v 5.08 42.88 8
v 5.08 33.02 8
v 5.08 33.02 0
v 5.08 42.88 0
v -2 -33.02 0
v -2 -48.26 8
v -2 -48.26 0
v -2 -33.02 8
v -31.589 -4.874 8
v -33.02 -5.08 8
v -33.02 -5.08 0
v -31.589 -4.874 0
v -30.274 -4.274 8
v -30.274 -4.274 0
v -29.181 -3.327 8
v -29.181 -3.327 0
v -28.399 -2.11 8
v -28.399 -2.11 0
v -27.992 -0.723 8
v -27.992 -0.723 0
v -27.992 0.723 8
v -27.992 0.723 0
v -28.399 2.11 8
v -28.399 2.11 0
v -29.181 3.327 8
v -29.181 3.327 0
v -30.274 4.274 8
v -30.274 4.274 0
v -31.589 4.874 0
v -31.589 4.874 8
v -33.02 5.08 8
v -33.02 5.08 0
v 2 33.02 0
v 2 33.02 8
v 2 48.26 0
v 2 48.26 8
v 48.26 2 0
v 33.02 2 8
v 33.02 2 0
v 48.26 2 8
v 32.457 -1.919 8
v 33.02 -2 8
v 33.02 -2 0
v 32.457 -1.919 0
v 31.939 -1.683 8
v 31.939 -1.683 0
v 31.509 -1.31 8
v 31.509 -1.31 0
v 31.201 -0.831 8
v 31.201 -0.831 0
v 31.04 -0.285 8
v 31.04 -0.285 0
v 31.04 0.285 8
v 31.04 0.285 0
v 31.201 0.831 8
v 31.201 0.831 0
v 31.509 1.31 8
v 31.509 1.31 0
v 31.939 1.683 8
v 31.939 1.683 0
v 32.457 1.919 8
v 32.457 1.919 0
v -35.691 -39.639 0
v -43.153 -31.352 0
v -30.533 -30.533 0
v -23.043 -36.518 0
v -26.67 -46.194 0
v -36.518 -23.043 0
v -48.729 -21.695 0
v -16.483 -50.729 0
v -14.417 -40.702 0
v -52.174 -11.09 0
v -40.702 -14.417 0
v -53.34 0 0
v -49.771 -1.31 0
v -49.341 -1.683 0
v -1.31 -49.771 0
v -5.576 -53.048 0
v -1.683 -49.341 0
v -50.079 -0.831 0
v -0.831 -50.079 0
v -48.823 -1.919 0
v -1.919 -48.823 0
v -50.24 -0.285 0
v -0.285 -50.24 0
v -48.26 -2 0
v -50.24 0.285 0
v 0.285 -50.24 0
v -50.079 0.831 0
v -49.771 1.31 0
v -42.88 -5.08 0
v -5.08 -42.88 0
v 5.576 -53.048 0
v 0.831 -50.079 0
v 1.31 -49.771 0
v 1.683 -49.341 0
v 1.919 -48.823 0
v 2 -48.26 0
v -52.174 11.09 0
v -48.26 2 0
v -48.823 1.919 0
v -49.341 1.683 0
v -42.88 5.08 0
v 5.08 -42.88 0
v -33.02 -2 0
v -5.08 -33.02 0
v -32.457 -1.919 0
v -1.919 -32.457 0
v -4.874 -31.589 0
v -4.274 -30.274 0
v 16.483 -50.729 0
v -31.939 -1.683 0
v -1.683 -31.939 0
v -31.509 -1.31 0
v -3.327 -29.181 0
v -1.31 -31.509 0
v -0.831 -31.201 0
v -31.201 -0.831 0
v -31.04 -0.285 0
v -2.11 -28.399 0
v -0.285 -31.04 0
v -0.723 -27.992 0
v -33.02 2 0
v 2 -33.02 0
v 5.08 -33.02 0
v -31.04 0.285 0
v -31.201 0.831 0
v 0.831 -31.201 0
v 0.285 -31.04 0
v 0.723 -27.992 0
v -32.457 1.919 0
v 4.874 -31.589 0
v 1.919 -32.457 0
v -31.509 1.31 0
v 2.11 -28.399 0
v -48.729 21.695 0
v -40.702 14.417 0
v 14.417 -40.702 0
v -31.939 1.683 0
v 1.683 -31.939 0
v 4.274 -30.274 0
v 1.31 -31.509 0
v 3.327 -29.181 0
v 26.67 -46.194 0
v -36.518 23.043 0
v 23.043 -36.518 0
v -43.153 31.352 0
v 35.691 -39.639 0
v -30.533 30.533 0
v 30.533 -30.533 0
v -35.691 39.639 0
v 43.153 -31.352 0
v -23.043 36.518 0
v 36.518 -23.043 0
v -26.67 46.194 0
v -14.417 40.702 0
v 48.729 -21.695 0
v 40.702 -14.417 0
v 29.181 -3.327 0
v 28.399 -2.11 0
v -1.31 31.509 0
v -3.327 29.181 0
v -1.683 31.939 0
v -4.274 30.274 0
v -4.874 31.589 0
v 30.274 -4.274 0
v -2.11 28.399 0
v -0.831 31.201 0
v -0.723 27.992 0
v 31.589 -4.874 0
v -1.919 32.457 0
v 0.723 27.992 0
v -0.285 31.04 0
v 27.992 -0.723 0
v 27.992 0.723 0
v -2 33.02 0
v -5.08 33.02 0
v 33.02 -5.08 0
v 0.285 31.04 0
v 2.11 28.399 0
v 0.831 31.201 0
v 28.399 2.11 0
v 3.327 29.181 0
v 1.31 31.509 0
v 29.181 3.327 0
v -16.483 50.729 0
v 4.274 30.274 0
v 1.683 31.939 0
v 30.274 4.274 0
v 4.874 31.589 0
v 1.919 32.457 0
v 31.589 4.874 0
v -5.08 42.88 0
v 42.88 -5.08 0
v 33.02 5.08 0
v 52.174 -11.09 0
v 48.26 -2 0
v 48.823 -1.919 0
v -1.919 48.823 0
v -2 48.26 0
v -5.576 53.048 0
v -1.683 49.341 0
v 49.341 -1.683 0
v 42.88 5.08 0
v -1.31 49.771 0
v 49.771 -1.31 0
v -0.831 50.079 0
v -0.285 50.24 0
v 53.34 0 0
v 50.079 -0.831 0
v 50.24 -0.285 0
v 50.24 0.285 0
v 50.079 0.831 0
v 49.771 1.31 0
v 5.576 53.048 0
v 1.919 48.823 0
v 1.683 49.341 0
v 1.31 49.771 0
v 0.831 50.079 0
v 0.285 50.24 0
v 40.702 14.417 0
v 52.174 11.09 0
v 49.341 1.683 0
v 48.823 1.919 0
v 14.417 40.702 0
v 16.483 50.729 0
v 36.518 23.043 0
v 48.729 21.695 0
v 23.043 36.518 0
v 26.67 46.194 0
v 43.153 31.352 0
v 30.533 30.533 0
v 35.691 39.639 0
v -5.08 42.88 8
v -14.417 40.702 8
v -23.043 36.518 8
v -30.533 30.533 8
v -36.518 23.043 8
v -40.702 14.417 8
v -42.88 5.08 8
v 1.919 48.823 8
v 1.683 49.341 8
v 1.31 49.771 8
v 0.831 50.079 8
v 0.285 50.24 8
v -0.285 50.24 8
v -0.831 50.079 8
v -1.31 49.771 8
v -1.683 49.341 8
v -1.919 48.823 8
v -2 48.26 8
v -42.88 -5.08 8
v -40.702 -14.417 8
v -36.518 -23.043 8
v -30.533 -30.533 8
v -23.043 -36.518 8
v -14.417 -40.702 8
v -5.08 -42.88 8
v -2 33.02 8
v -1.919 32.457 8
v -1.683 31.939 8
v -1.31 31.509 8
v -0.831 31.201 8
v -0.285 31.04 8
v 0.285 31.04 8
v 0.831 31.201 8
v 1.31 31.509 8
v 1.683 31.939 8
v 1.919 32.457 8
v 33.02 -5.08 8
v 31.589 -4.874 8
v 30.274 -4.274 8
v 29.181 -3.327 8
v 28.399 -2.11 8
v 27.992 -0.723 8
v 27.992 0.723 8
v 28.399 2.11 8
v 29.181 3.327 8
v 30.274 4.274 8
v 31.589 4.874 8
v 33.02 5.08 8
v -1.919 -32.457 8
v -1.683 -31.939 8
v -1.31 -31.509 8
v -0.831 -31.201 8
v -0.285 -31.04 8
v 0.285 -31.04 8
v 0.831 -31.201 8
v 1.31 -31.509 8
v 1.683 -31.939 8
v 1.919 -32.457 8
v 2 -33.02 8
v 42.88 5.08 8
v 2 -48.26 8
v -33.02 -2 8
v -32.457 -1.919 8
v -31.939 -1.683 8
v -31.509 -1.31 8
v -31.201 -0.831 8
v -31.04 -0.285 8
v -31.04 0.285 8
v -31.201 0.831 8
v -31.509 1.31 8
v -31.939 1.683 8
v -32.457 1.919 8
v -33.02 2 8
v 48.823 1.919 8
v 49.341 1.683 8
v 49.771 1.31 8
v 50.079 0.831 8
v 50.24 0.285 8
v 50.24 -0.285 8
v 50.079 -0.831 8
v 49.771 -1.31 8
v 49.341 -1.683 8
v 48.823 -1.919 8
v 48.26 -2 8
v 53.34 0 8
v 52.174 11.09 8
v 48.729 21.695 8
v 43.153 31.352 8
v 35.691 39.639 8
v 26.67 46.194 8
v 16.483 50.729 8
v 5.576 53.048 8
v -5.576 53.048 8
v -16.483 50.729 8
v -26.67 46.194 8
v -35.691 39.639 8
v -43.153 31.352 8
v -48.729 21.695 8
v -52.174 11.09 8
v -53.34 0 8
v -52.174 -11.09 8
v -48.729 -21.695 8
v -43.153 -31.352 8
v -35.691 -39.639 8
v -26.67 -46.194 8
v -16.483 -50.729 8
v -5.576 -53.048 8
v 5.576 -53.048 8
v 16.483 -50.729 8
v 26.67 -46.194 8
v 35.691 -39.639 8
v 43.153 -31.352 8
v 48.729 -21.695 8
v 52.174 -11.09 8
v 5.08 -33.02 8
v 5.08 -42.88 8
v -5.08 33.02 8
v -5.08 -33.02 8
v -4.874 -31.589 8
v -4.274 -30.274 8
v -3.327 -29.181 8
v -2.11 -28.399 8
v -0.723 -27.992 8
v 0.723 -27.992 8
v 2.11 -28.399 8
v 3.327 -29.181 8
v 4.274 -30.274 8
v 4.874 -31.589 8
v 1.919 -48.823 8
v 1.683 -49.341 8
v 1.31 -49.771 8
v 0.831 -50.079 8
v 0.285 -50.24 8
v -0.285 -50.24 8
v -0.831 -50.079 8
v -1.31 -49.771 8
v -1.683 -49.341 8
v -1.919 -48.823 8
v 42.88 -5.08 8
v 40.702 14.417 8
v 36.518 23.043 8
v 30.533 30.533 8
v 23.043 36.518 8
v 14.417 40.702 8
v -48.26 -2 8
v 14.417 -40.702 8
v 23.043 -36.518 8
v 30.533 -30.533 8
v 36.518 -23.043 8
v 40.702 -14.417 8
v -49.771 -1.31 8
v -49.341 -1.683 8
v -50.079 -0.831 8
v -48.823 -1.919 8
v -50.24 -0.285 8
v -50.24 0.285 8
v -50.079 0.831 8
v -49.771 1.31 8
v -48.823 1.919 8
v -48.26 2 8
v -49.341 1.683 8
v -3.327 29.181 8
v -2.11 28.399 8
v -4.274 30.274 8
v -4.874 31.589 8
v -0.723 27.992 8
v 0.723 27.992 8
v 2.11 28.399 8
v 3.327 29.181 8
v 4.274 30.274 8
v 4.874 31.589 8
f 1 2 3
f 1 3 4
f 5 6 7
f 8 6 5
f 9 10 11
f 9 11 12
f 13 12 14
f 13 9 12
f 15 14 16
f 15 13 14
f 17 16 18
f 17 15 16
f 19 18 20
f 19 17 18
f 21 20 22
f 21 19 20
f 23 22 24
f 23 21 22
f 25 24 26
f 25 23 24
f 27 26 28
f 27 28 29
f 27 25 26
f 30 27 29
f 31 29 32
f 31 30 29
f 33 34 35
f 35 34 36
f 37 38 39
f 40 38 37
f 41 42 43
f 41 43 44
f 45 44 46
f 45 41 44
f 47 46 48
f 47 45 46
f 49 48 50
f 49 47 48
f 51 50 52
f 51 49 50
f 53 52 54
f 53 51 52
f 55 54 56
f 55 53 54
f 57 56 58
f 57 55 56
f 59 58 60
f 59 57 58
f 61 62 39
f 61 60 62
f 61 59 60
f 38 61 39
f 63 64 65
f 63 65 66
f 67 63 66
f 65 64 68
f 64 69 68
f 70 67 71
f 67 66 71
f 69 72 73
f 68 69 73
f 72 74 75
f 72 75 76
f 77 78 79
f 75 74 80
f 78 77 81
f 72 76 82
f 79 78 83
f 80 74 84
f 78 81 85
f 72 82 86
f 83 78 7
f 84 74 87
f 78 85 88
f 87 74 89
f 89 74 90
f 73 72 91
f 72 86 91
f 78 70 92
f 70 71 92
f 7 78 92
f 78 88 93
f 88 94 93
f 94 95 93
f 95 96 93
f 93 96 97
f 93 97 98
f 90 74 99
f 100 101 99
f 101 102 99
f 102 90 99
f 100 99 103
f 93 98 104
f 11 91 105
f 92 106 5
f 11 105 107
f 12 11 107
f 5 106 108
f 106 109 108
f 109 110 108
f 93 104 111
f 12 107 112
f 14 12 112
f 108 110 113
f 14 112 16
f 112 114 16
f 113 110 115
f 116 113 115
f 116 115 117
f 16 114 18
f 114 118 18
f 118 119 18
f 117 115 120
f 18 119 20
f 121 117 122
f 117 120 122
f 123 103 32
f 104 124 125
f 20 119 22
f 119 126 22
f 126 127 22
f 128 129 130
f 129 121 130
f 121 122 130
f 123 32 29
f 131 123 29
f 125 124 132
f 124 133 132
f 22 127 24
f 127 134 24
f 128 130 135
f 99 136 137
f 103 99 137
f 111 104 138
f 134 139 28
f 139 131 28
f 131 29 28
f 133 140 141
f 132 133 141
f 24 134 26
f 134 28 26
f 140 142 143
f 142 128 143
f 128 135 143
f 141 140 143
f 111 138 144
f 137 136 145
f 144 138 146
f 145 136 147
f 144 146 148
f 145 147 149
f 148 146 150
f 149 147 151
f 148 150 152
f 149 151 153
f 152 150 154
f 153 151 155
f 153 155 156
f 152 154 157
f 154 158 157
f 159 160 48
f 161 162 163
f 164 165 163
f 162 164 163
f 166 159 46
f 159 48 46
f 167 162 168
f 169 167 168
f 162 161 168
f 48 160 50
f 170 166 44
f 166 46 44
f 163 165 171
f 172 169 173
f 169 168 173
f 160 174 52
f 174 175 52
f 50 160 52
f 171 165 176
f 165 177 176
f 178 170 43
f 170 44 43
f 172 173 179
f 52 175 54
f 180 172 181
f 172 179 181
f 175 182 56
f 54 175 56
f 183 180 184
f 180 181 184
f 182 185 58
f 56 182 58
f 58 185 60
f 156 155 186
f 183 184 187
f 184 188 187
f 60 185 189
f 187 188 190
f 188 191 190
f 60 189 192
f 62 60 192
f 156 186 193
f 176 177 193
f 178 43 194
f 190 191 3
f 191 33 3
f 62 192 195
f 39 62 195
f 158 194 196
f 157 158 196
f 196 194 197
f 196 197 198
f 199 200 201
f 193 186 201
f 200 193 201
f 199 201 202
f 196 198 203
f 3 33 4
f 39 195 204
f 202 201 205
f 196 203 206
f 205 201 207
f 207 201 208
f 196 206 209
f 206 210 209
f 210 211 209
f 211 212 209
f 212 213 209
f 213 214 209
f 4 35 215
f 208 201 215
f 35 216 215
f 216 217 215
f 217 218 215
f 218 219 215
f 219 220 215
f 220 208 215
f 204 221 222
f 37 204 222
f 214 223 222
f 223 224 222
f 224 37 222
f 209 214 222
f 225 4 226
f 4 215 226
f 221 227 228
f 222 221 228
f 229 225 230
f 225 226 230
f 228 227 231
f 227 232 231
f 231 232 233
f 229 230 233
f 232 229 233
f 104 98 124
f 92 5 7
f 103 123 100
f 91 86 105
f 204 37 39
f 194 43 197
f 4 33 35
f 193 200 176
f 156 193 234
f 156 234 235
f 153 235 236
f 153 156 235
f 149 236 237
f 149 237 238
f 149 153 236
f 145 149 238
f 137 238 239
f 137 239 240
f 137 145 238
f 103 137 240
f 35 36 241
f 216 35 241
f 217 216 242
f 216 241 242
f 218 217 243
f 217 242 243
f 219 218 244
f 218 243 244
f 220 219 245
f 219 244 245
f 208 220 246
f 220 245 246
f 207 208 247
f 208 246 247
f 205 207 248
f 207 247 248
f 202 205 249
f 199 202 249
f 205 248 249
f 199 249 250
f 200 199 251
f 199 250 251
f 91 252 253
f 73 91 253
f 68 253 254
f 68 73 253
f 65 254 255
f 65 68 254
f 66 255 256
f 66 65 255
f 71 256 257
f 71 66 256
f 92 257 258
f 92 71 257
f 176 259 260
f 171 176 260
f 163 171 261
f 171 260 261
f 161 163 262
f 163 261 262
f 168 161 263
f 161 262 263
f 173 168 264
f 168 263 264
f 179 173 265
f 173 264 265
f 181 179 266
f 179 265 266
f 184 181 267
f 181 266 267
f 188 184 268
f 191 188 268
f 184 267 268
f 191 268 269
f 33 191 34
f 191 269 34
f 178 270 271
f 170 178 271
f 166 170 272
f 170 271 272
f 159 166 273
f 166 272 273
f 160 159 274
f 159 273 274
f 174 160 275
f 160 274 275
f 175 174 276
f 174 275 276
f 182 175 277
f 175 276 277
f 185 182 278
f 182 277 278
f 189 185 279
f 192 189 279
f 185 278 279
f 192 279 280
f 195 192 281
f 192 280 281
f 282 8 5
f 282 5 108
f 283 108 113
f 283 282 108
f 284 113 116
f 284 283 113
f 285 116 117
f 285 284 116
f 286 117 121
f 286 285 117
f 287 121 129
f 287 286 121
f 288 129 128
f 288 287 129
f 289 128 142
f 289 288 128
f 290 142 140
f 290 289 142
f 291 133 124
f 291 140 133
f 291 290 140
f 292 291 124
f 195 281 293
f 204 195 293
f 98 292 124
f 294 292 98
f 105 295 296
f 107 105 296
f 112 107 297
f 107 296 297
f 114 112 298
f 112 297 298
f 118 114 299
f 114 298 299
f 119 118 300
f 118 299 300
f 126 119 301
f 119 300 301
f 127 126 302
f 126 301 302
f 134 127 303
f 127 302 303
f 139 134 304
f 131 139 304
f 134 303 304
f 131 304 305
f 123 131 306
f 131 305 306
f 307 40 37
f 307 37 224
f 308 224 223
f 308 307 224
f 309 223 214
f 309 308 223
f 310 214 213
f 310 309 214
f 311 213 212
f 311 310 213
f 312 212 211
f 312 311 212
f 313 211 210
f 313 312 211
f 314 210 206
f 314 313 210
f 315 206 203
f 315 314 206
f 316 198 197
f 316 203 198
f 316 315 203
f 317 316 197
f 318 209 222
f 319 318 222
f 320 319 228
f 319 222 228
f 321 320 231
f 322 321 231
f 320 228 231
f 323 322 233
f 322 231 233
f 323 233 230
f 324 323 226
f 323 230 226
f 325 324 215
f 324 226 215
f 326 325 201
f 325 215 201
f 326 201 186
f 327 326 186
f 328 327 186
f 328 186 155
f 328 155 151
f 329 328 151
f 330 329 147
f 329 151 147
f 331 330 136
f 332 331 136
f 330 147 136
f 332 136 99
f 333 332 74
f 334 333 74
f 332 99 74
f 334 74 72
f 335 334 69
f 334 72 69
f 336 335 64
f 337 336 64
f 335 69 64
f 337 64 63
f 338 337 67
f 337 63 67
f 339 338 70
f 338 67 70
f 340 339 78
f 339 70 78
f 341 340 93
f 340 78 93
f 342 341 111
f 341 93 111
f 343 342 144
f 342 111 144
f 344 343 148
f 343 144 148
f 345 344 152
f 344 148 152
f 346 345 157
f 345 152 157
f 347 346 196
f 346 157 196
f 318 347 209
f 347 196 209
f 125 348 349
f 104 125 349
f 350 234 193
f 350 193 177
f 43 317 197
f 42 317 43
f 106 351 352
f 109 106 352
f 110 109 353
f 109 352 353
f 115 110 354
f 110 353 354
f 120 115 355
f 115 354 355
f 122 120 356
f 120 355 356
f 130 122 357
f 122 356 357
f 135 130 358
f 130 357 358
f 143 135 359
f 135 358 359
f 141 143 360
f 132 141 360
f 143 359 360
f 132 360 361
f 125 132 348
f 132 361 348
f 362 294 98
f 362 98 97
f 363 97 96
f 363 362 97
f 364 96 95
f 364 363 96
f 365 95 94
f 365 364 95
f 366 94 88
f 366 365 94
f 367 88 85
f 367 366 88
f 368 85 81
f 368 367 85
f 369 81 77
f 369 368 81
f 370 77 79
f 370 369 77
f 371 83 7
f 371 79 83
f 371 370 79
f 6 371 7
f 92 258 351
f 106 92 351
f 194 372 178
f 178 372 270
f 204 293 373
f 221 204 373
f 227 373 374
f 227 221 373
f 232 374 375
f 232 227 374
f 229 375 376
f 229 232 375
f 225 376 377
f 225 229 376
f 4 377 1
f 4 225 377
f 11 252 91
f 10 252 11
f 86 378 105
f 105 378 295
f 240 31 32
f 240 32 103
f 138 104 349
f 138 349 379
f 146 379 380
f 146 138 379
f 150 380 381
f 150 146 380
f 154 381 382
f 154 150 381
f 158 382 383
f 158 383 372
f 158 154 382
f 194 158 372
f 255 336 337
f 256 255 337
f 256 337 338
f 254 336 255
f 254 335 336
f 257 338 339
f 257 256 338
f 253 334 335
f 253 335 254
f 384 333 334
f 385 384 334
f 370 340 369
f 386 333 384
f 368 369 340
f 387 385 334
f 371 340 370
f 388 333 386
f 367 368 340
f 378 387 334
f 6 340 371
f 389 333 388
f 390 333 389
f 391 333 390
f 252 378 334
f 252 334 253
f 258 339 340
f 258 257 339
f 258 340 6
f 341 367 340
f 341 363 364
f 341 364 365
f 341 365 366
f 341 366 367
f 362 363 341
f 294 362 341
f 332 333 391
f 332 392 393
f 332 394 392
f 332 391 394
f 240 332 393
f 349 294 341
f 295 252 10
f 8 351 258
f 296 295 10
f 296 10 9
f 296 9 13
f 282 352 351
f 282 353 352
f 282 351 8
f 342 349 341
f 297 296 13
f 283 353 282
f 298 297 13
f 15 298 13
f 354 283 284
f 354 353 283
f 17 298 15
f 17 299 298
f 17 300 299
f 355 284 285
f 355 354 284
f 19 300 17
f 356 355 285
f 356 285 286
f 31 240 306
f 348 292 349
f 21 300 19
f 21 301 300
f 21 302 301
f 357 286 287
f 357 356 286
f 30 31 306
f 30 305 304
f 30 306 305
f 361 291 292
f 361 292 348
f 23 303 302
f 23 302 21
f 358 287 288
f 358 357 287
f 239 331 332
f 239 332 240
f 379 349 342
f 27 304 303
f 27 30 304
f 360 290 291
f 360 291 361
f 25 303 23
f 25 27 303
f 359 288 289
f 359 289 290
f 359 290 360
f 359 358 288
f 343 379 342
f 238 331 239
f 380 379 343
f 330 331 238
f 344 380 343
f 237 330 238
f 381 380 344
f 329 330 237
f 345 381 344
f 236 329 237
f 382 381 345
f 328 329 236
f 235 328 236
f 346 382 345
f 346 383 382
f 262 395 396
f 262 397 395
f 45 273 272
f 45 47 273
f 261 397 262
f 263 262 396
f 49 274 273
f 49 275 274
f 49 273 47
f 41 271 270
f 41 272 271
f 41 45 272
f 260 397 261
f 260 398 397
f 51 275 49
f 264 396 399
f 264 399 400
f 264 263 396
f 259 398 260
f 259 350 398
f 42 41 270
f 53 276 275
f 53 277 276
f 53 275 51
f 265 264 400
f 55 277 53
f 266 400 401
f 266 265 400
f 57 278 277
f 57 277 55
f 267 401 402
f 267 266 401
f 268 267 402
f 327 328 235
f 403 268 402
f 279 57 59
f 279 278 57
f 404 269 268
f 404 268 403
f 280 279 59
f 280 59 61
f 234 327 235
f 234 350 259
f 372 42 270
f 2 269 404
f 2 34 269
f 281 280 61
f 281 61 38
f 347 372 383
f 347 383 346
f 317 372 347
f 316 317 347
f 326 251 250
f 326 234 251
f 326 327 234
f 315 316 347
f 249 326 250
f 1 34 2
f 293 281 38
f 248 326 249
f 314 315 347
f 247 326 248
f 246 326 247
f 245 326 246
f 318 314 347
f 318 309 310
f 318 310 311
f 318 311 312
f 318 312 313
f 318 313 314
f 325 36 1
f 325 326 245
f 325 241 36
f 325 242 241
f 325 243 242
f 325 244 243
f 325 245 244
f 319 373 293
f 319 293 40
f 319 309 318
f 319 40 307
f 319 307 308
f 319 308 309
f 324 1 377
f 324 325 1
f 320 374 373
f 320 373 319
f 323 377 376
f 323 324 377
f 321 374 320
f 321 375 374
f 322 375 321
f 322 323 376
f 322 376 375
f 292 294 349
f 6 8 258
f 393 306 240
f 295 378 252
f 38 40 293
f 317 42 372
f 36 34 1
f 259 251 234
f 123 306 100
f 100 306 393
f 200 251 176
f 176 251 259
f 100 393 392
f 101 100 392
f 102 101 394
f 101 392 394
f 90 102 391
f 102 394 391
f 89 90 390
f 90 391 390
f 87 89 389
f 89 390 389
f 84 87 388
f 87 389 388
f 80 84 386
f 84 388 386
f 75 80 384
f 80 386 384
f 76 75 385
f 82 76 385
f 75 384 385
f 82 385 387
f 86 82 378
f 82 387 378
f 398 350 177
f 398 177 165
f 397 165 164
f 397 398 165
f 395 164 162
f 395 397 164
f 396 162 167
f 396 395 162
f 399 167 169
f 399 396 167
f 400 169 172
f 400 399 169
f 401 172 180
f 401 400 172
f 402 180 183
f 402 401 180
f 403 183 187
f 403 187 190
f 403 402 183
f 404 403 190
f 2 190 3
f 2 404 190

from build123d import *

# Parameters (mm, degrees)
SKETCH2_R          = 53.34
SKETCH2_R_2        = 43.18
EXTRUDE3_DEPTH     = 8
EXTRUDE4_DEPTH     = 8
EXTRUDE5_DEPTH     = 8
CUT_EXTRUDE1_DEPTH = 9
CUT_EXTRUDE2_DEPTH = 9


with BuildPart() as part:
    # Sketch2 → Extrude3 (new body)
    with BuildSketch(Plane.XY):
        Circle(SKETCH2_R)
        Circle(SKETCH2_R_2, mode=Mode.SUBTRACT)
    extrude(amount=EXTRUDE3_DEPTH)

    # Sketch3 → Extrude4 (add)
    with BuildSketch(Plane.XY.offset(8)):
        with BuildLine():
            ThreePointArc((5.08, 48.26), (0, 43.18), (-5.08, 48.26))
            Line((-5.08, 48.26), (-5.08, 33.02))
            ThreePointArc((-5.08, 33.02), (0, 27.94), (5.08, 33.02))
            Line((5.08, 33.02), (5.08, 48.26))
        make_face()
    extrude4 = extrude(amount=-EXTRUDE4_DEPTH)

    # Mirror1: Extrude4 across plane
    add(extrude4.mirror(Plane.ZX))

    # Sketch4 → Extrude5 (add)
    with BuildSketch(Plane.XY.offset(8)):
        with BuildLine():
            ThreePointArc((-48.26, 5.08), (-43.18, 0), (-48.26, -5.08))
            Line((-48.26, -5.08), (-33.02, -5.08))
            ThreePointArc((-33.02, -5.08), (-27.94, 0), (-33.02, 5.08))
            Line((-33.02, 5.08), (-48.26, 5.08))
        make_face()
    extrude5 = extrude(amount=-EXTRUDE5_DEPTH)

    # Mirror2: Extrude5 across plane
    add(extrude5.mirror(Plane(origin=(0, 0, 0), x_dir=(0, 0, 1), z_dir=(1, 0, 0))))

    # Sketch5 → Cut-Extrude1 (cut, through all)
    with BuildSketch(Plane.XY.offset(8)):
        with BuildLine():
            Line((2, 33.02), (2, 48.26))
            ThreePointArc((2, 48.26), (0, 50.26), (-2, 48.26))
            Line((-2, 48.26), (-2, 33.02))
            ThreePointArc((-2, 33.02), (0, 31.02), (2, 33.02))
        make_face()
    cut_extrude1 = extrude(amount=-CUT_EXTRUDE1_DEPTH, mode=Mode.SUBTRACT)

    # Mirror3: Cut-Extrude1 across plane
    add(cut_extrude1.mirror(Plane.ZX), mode=Mode.SUBTRACT)

    # Sketch6 → Cut-Extrude2 (cut, through all)
    with BuildSketch(Plane.XY.offset(8)):
        with BuildLine():
            Line((-33.02, 2), (-48.26, 2))
            ThreePointArc((-48.26, 2), (-50.26, 0), (-48.26, -2))
            Line((-48.26, -2), (-33.02, -2))
            ThreePointArc((-33.02, -2), (-31.02, 0), (-33.02, 2))
        make_face()
    cut_extrude2 = extrude(amount=-CUT_EXTRUDE2_DEPTH, mode=Mode.SUBTRACT)

    # Mirror4: Cut-Extrude2 across plane
    add(cut_extrude2.mirror(Plane(origin=(0, 0, 0), x_dir=(0, 0, 1), z_dir=(1, 0, 0))), mode=Mode.SUBTRACT)


solid = part.part
